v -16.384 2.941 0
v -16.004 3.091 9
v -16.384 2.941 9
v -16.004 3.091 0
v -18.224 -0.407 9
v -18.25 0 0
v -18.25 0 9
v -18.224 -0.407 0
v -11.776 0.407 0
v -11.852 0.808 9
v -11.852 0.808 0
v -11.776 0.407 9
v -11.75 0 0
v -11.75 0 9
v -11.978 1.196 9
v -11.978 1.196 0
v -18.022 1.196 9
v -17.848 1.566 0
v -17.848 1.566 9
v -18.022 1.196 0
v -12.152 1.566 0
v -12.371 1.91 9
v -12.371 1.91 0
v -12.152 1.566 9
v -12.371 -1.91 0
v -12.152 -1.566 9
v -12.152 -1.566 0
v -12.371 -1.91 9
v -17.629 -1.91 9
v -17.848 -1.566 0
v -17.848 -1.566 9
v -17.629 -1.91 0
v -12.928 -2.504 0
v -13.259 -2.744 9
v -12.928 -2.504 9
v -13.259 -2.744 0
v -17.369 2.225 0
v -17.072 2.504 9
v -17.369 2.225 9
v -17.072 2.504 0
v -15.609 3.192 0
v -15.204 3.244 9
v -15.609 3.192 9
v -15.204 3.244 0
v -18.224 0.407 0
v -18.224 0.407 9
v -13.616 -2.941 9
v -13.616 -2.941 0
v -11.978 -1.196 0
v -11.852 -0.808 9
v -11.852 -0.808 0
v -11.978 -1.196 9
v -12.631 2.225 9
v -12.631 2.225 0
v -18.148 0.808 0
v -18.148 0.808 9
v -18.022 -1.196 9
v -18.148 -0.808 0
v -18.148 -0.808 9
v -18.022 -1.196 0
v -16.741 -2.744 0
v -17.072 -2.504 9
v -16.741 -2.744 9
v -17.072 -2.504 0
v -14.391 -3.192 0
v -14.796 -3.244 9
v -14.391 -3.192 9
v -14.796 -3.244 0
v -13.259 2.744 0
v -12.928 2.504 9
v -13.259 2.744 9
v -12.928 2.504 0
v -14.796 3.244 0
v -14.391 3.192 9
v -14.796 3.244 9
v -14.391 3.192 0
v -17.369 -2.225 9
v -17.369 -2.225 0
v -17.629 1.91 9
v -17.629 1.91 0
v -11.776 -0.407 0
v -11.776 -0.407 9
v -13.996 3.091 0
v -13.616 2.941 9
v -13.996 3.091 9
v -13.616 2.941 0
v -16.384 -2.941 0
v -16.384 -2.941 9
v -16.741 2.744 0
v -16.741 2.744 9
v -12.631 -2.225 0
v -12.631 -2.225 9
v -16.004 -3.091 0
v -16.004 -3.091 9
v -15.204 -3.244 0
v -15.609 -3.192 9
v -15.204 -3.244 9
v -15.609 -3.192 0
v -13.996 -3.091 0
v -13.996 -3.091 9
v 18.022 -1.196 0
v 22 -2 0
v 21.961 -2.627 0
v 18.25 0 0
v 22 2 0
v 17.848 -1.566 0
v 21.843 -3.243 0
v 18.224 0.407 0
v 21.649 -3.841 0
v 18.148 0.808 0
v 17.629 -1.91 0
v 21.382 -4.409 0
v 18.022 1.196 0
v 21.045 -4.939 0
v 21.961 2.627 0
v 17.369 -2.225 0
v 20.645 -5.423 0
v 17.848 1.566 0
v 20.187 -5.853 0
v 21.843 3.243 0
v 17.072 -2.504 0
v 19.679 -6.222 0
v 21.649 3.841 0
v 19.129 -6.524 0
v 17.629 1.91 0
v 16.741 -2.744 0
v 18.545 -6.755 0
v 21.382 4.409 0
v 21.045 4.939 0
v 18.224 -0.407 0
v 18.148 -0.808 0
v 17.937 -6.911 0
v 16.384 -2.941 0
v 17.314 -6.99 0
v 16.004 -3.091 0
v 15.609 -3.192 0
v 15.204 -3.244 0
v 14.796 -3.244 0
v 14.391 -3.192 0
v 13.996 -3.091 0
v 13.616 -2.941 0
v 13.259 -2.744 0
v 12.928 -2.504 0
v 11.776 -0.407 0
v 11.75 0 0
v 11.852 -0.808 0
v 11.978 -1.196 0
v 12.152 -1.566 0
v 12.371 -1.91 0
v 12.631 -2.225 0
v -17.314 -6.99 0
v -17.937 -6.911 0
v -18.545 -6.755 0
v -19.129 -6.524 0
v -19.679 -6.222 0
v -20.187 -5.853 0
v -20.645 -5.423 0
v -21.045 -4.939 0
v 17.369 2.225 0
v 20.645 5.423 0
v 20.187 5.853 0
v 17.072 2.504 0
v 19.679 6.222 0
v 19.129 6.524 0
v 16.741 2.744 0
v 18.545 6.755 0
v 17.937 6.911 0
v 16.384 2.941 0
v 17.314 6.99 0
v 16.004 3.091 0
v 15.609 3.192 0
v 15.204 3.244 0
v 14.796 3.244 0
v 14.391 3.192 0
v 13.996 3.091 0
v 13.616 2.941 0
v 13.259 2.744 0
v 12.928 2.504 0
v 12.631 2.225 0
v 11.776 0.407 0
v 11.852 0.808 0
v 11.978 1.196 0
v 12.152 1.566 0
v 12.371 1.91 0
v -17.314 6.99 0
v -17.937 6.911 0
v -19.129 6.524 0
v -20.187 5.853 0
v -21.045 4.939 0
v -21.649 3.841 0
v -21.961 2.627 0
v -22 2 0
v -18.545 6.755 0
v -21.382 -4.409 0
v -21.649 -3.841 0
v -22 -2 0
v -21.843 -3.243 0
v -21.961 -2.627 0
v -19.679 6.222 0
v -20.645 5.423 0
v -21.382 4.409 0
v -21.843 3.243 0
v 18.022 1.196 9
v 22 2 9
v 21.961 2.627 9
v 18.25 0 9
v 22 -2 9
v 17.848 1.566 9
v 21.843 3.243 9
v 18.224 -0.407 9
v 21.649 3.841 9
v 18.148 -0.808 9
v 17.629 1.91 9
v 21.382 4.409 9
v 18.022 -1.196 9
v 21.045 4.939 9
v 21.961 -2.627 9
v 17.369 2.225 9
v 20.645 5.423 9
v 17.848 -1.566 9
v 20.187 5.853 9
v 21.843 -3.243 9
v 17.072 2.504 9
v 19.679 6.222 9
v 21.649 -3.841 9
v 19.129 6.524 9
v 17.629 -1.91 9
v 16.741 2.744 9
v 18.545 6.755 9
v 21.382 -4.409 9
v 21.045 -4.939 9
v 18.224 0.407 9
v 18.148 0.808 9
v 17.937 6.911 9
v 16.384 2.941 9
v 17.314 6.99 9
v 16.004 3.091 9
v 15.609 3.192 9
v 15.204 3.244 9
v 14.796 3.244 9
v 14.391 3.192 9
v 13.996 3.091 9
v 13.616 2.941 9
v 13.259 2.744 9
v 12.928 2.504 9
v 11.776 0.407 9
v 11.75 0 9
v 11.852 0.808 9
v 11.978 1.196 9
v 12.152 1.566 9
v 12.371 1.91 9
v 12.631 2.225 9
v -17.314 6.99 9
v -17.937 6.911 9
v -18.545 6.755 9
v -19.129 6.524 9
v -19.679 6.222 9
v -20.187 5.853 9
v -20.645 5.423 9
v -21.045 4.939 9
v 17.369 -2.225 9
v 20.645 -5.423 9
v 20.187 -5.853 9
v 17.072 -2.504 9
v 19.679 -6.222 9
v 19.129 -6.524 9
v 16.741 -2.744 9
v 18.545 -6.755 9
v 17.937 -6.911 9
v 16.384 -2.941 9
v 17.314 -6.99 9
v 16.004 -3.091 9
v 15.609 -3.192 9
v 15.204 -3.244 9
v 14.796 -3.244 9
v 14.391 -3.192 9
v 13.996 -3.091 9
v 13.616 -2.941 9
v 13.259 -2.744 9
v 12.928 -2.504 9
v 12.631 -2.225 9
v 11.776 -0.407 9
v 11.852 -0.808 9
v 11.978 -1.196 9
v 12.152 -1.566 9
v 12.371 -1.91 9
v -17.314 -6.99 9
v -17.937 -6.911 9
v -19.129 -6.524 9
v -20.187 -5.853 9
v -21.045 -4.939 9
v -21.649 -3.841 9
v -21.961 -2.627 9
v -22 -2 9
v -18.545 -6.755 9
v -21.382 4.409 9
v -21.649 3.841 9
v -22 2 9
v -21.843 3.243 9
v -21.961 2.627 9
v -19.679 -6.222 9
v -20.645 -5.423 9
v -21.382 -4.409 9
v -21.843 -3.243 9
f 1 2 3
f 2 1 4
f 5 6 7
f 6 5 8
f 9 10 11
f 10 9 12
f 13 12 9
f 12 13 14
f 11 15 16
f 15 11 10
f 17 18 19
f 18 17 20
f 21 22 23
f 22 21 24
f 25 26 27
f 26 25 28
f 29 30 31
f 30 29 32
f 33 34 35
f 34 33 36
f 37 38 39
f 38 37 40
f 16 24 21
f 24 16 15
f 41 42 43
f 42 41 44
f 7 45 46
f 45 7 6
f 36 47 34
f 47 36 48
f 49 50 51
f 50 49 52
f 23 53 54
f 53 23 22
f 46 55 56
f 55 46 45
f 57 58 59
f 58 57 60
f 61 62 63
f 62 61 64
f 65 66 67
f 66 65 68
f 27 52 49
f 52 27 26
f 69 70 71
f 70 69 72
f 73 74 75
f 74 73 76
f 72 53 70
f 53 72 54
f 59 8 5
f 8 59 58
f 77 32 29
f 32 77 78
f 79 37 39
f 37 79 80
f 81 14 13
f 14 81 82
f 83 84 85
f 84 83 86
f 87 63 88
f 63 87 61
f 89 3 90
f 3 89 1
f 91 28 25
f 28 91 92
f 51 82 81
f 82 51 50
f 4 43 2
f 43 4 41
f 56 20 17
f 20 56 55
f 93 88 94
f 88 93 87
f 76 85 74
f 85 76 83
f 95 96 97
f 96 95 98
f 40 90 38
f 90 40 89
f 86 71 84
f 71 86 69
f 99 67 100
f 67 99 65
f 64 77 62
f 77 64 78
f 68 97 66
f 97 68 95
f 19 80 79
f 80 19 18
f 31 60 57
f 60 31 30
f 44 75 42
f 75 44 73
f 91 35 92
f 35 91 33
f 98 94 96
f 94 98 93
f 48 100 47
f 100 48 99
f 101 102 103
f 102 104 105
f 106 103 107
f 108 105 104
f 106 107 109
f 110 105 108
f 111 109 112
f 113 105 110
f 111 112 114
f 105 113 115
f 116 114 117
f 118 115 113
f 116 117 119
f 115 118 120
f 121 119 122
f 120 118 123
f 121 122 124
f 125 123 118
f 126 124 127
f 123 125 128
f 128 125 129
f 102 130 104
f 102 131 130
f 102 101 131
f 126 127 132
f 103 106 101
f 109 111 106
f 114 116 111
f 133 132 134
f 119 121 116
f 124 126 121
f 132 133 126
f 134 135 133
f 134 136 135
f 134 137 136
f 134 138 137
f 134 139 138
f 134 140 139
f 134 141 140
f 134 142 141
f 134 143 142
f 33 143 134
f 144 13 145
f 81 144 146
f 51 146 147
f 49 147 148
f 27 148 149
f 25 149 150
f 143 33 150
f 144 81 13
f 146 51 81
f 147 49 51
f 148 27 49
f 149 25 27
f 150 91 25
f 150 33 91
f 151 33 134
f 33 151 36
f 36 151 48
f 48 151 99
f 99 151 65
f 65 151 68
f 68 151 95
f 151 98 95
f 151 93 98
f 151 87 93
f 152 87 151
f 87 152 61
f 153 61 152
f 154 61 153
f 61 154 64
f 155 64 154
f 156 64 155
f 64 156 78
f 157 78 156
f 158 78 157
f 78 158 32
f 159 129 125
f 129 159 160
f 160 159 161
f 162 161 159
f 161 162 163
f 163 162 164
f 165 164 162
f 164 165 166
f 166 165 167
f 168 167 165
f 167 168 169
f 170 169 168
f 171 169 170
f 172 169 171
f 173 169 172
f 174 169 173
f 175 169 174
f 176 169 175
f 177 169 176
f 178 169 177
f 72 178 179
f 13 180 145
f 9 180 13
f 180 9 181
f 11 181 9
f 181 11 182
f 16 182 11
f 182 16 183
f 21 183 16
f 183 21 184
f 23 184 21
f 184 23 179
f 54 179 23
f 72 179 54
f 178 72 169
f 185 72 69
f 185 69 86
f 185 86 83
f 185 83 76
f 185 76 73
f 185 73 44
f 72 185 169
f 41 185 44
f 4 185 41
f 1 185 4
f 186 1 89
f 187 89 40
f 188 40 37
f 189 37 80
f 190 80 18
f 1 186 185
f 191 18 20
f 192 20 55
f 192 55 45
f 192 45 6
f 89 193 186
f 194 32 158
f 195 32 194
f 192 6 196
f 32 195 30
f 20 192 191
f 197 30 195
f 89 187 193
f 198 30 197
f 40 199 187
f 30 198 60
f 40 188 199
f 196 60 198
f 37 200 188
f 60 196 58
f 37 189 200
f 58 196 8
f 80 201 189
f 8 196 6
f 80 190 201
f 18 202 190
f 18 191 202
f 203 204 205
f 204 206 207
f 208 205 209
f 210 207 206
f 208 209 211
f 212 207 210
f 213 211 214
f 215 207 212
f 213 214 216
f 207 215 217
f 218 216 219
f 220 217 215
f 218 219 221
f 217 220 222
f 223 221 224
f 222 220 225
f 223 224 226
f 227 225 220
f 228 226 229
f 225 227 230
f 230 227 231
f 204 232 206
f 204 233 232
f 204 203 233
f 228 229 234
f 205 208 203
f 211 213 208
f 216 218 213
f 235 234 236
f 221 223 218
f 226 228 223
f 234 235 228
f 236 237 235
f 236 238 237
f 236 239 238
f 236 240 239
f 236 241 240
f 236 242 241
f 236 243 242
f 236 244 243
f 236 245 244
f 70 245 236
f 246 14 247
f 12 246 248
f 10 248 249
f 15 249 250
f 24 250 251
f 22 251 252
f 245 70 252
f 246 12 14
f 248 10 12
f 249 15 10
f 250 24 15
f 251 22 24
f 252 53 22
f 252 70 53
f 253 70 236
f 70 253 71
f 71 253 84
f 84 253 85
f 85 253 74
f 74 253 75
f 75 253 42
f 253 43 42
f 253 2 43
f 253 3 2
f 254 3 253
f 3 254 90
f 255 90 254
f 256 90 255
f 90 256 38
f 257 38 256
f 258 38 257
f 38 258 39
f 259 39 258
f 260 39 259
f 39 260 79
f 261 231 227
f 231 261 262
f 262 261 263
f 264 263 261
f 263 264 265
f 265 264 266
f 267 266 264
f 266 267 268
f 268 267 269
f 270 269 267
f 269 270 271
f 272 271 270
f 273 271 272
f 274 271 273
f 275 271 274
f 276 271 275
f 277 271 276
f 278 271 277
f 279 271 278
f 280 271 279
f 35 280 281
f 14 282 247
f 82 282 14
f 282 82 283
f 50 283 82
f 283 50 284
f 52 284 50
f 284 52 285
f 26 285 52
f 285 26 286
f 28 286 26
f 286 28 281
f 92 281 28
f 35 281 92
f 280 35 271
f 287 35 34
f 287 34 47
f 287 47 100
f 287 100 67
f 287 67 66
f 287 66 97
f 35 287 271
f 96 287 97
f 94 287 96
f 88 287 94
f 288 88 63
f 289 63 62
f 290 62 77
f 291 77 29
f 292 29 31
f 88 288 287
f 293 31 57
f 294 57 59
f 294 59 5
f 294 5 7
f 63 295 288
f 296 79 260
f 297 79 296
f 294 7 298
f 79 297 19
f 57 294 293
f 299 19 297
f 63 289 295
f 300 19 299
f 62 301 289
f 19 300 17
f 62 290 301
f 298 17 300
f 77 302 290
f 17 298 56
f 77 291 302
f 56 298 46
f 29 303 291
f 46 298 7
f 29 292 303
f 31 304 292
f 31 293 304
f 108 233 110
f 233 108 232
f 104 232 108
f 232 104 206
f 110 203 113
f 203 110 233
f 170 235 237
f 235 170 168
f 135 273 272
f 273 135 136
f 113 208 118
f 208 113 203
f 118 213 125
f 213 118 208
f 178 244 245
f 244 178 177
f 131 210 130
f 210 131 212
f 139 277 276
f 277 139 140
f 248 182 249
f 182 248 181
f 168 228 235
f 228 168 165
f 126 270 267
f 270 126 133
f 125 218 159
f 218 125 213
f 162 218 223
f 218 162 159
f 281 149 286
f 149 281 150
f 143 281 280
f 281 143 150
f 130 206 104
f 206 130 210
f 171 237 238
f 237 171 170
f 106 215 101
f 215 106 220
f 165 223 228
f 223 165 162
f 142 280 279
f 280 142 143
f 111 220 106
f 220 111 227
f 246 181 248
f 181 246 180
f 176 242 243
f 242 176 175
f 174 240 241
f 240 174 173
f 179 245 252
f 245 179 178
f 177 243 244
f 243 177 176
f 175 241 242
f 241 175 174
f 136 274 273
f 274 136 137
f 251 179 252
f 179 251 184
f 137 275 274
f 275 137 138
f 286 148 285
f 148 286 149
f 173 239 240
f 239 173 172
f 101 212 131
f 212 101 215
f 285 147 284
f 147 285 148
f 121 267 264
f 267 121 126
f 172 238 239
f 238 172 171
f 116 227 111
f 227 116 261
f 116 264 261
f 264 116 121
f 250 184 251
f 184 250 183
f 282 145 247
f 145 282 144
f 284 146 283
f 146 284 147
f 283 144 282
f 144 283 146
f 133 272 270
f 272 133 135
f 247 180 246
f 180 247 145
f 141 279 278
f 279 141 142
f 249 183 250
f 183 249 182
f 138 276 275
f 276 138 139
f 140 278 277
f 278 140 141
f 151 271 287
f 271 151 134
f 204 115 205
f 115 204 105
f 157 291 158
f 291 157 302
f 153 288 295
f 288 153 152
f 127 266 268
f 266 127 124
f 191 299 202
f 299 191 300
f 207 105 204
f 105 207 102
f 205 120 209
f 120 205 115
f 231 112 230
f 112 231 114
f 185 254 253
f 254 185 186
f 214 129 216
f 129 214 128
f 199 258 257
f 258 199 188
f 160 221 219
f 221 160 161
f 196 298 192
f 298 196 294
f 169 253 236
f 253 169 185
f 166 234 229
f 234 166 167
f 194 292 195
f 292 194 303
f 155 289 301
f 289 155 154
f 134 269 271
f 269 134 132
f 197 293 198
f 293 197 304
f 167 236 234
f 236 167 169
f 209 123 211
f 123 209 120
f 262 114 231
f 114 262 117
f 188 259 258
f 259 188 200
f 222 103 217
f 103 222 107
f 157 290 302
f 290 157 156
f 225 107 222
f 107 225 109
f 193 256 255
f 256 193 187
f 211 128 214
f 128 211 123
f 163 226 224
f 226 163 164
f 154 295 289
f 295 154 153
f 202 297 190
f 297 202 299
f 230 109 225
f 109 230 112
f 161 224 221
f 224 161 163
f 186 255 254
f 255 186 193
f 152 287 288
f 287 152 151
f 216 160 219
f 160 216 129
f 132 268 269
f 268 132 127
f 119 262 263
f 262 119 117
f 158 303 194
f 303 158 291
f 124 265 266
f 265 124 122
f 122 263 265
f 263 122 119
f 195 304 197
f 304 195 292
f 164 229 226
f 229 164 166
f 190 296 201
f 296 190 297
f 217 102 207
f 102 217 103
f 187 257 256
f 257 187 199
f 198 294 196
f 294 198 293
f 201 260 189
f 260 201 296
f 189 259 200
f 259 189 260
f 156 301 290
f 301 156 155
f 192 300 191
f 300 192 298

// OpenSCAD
$fn = 50;


difference() {
	union() {
		hull() {
			translate(v = [-17.0000000000, 2.0000000000, 0]) {
				cylinder(h = 9, r = 5);
			}
			translate(v = [17.0000000000, 2.0000000000, 0]) {
				cylinder(h = 9, r = 5);
			}
			translate(v = [-17.0000000000, -2.0000000000, 0]) {
				cylinder(h = 9, r = 5);
			}
			translate(v = [17.0000000000, -2.0000000000, 0]) {
				cylinder(h = 9, r = 5);
			}
		}
	}
	union() {
		translate(v = [-15.0000000000, 0.0000000000, 0]) {
			cylinder(h = 9, r = 3.2500000000);
		}
		translate(v = [15.0000000000, 0.0000000000, 0]) {
			cylinder(h = 9, r = 3.2500000000);
		}
		translate(v = [-15.0000000000, 0.0000000000, 0]) {
			cylinder(h = 9, r = 1.8000000000);
		}
		translate(v = [15.0000000000, 0.0000000000, 0]) {
			cylinder(h = 9, r = 1.8000000000);
		}
		translate(v = [-15.0000000000, 0.0000000000, 0]) {
			cylinder(h = 9, r = 1.8000000000);
		}
		translate(v = [15.0000000000, 0.0000000000, 0]) {
			cylinder(h = 9, r = 1.8000000000);
		}
		translate(v = [-15.0000000000, 0.0000000000, 0]) {
			cylinder(h = 9, r = 1.8000000000);
		}
		translate(v = [15.0000000000, 0.0000000000, 0]) {
			cylinder(h = 9, r = 1.8000000000);
		}
	}
}
